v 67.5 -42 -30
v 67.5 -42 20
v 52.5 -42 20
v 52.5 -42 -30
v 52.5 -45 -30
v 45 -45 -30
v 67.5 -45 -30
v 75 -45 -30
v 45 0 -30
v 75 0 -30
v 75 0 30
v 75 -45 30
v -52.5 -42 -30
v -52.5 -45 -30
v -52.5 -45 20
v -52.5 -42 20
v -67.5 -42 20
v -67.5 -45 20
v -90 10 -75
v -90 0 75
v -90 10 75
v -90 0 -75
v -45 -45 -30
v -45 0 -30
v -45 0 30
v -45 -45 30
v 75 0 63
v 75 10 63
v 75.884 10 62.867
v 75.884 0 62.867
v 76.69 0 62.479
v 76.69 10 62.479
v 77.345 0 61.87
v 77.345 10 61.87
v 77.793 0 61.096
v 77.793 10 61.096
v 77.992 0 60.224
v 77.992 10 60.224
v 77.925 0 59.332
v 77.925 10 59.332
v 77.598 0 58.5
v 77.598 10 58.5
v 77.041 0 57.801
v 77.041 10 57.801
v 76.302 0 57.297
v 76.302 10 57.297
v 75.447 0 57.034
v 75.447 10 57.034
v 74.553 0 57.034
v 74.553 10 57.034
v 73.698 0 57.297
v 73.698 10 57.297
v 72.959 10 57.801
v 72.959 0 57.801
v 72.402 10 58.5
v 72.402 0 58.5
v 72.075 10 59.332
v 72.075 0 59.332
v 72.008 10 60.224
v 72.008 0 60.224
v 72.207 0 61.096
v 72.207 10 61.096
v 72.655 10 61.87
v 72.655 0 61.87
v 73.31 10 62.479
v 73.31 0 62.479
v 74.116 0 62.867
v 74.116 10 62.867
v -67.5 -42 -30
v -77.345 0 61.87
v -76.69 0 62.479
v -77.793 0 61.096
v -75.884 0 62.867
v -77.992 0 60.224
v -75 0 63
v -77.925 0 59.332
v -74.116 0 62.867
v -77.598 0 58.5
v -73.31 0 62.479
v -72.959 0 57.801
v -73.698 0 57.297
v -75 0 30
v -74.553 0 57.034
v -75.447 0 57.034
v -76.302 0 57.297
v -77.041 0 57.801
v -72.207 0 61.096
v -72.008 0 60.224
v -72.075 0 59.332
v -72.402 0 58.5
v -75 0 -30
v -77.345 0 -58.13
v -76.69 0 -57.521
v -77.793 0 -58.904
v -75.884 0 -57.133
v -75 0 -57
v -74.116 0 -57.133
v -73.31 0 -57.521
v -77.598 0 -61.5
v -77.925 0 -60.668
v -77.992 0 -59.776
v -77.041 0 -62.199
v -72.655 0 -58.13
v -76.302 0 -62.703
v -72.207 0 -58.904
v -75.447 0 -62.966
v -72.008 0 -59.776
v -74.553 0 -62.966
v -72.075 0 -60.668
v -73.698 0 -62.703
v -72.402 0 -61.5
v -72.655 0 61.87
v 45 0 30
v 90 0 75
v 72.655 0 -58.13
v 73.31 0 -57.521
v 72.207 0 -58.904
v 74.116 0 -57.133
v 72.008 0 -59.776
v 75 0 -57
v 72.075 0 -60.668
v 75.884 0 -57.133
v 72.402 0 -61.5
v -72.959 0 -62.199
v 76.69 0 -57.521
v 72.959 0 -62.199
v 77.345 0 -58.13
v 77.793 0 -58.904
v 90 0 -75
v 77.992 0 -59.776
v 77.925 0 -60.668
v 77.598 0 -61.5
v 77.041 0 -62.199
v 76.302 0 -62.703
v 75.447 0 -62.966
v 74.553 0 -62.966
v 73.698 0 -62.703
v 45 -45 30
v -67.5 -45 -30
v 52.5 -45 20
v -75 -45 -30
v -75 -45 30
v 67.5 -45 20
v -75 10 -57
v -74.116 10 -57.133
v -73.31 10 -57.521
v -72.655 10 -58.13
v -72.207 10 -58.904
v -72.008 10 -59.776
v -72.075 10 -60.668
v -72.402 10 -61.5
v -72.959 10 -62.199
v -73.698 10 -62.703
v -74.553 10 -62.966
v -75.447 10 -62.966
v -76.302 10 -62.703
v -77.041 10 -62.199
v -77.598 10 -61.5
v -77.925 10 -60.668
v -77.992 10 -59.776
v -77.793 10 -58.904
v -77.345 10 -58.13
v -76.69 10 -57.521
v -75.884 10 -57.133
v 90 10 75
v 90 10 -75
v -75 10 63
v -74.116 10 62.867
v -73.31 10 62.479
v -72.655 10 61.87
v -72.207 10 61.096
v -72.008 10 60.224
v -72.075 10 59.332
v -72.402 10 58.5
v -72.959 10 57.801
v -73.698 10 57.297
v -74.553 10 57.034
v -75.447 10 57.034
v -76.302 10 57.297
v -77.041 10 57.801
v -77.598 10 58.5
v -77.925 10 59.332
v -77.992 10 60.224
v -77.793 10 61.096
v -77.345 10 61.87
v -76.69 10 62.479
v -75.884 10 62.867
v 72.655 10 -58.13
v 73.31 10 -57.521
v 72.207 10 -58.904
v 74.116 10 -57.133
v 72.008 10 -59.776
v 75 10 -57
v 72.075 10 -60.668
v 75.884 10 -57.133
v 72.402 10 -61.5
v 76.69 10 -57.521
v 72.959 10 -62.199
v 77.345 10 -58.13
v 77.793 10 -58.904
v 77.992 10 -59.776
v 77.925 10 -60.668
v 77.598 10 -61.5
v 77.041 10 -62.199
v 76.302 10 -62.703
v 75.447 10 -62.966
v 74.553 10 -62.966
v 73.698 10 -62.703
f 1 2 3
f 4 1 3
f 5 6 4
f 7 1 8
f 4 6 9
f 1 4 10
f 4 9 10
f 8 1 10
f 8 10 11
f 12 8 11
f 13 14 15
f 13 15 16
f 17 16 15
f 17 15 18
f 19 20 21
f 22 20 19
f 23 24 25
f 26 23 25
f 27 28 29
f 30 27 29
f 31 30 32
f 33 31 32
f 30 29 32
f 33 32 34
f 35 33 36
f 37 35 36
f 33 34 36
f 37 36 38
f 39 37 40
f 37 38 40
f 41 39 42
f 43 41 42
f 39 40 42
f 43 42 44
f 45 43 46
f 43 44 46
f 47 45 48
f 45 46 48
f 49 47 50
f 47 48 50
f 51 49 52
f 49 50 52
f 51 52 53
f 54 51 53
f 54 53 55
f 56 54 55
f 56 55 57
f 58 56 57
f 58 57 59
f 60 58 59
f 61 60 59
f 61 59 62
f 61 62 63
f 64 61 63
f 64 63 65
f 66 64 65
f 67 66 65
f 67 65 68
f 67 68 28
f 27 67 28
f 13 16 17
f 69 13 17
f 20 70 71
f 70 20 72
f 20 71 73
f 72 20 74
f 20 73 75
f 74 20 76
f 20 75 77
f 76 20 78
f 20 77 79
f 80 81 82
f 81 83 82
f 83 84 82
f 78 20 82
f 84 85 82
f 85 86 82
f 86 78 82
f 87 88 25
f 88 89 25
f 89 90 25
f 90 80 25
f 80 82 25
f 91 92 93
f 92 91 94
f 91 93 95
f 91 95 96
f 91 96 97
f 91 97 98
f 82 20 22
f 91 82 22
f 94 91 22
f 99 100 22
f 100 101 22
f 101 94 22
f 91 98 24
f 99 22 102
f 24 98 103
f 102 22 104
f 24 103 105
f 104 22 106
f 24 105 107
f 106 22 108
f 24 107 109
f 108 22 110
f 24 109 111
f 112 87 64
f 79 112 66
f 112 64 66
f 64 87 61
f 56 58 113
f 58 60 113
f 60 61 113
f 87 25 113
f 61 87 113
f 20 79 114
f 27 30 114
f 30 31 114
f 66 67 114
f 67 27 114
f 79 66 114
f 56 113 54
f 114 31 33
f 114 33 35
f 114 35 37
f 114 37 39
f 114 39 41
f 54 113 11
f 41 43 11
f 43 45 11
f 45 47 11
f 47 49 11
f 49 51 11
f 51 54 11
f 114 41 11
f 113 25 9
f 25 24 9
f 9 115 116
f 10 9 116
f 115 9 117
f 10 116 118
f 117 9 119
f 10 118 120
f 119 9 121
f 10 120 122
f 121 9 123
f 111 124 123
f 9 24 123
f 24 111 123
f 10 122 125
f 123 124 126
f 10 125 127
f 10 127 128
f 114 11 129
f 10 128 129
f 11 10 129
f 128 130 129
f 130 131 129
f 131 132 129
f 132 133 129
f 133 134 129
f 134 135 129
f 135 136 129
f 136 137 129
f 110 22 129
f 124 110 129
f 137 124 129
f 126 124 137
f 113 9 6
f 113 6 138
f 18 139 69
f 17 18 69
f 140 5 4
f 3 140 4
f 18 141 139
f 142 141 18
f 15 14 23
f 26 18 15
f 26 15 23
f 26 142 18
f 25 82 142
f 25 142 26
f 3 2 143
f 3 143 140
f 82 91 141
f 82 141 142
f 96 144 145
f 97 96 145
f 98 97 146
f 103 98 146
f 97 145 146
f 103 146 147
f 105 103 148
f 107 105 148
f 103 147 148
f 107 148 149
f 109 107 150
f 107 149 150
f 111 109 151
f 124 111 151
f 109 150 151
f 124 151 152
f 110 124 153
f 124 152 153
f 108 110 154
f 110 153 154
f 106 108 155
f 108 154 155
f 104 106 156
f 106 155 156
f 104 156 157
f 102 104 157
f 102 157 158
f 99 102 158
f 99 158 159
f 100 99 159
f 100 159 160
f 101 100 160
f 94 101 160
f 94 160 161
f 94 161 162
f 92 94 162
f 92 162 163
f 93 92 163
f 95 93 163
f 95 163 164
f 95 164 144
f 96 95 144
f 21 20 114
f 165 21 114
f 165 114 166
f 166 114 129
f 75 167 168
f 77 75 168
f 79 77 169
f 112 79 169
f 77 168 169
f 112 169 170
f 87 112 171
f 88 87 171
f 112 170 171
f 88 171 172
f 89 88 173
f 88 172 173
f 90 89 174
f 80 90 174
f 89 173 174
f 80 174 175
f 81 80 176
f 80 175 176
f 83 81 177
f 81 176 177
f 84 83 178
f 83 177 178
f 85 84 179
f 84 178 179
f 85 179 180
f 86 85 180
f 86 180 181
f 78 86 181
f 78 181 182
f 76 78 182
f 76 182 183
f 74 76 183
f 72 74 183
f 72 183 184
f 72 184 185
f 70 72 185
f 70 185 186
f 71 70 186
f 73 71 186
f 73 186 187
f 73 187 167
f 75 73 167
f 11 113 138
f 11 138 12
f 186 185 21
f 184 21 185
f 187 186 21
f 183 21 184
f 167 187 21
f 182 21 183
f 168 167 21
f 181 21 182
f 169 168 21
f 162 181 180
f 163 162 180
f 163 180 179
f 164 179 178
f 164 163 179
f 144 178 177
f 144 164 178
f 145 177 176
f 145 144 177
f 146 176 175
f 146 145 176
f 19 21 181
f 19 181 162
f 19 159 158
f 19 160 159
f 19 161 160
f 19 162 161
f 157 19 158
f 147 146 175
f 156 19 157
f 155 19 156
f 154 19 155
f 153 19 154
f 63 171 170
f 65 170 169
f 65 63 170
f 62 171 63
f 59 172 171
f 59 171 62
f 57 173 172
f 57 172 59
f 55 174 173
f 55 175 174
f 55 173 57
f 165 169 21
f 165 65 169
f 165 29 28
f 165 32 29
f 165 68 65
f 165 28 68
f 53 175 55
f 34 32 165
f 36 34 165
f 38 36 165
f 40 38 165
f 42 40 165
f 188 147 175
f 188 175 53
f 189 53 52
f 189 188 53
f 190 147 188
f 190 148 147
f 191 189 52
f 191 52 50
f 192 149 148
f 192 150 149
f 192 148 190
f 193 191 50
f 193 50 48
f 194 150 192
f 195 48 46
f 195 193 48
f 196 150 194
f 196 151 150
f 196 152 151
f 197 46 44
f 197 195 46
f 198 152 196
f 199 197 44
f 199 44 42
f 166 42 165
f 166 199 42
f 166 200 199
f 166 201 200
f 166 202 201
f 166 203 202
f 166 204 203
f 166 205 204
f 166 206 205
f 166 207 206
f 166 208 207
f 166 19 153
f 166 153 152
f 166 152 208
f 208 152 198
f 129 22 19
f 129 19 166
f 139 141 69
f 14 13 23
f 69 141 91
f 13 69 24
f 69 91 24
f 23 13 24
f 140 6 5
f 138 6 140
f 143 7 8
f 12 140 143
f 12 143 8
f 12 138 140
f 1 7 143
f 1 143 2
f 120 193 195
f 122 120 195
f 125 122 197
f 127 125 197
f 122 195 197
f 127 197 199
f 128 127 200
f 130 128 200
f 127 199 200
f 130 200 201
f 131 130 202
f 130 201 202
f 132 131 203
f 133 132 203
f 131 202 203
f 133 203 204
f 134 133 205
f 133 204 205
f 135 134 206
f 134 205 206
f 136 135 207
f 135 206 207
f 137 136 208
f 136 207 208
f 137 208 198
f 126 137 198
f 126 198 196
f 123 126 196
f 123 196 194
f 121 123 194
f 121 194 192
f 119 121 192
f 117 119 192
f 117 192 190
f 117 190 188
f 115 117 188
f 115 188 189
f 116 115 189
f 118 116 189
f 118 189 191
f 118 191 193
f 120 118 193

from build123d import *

# Parameters (mm, degrees)
IZIM1_W                     = 180
IZIM1_H                     = 150
Y_KSEKLIK_EKSTR_ZYON1_DEPTH = 10
IZIM2_R                     = 3
KES_EKSTR_ZYON1_DEPTH       = 35
IZIM3_W                     = 30
IZIM3_H                     = 60
Y_KSEKLIK_EKSTR_ZYON2_DEPTH = 45
IZIM5_W                     = 15
IZIM5_H                     = 3
KES_EKSTR_ZYON2_DEPTH       = 50
IZIM7_W                     = 15
IZIM7_H                     = 3
KES_EKSTR_ZYON3_DEPTH       = 50


with BuildPart() as part:
    # Çizim1 → Yükseklik-Ekstrüzyon1 (new body)
    with BuildSketch(Plane(origin=(0, 0, 0), x_dir=(1, 0, 0), z_dir=(0, 1, 0))):
        Rectangle(IZIM1_W, IZIM1_H)
    extrude(amount=Y_KSEKLIK_EKSTR_ZYON1_DEPTH)

    # Çizim2 → Kes-Ekstrüzyon1 (cut)
    with BuildSketch(Plane(origin=(0, 10, 0), x_dir=(1, 0, 0), z_dir=(0, 1, 0))):
        with Locations(Location((-75, 60, 0), (0, 0, 270))):
            Circle(IZIM2_R)
        with Locations(Location((-75, -60, 0), (0, 0, 270))):
            Circle(IZIM2_R)
        with Locations(Location((75, -60, 0), (0, 0, 270))):
            Circle(IZIM2_R)
        with Locations(Location((75, 60, 0), (0, 0, 270))):
            Circle(IZIM2_R)
    extrude(amount=-KES_EKSTR_ZYON1_DEPTH, mode=Mode.SUBTRACT)

    # Çizim3 → Yükseklik-Ekstrüzyon2 (add)
    with BuildSketch(Plane.XZ):
        with Locations((-60, 0)):
            Rectangle(IZIM3_W, IZIM3_H)
        with Locations((60, 0)):
            Rectangle(IZIM3_W, IZIM3_H)
    extrude(amount=Y_KSEKLIK_EKSTR_ZYON2_DEPTH)

    # Çizim5 → Kes-Ekstrüzyon2 (cut)
    with BuildSketch(Plane(origin=(0, 0, -30), x_dir=(-1, 0, 0), z_dir=(0, 0, -1))):
        with Locations((60, -43.5)):
            Rectangle(IZIM5_W, IZIM5_H)
    extrude(amount=-KES_EKSTR_ZYON2_DEPTH, mode=Mode.SUBTRACT)

    # Çizim7 → Kes-Ekstrüzyon3 (cut)
    with BuildSketch(Plane(origin=(0, 0, -30), x_dir=(-1, 0, 0), z_dir=(0, 0, -1))):
        with Locations((-60, -43.5)):
            Rectangle(IZIM7_W, IZIM7_H)
    extrude(amount=-KES_EKSTR_ZYON3_DEPTH, mode=Mode.SUBTRACT)


solid = part.part
